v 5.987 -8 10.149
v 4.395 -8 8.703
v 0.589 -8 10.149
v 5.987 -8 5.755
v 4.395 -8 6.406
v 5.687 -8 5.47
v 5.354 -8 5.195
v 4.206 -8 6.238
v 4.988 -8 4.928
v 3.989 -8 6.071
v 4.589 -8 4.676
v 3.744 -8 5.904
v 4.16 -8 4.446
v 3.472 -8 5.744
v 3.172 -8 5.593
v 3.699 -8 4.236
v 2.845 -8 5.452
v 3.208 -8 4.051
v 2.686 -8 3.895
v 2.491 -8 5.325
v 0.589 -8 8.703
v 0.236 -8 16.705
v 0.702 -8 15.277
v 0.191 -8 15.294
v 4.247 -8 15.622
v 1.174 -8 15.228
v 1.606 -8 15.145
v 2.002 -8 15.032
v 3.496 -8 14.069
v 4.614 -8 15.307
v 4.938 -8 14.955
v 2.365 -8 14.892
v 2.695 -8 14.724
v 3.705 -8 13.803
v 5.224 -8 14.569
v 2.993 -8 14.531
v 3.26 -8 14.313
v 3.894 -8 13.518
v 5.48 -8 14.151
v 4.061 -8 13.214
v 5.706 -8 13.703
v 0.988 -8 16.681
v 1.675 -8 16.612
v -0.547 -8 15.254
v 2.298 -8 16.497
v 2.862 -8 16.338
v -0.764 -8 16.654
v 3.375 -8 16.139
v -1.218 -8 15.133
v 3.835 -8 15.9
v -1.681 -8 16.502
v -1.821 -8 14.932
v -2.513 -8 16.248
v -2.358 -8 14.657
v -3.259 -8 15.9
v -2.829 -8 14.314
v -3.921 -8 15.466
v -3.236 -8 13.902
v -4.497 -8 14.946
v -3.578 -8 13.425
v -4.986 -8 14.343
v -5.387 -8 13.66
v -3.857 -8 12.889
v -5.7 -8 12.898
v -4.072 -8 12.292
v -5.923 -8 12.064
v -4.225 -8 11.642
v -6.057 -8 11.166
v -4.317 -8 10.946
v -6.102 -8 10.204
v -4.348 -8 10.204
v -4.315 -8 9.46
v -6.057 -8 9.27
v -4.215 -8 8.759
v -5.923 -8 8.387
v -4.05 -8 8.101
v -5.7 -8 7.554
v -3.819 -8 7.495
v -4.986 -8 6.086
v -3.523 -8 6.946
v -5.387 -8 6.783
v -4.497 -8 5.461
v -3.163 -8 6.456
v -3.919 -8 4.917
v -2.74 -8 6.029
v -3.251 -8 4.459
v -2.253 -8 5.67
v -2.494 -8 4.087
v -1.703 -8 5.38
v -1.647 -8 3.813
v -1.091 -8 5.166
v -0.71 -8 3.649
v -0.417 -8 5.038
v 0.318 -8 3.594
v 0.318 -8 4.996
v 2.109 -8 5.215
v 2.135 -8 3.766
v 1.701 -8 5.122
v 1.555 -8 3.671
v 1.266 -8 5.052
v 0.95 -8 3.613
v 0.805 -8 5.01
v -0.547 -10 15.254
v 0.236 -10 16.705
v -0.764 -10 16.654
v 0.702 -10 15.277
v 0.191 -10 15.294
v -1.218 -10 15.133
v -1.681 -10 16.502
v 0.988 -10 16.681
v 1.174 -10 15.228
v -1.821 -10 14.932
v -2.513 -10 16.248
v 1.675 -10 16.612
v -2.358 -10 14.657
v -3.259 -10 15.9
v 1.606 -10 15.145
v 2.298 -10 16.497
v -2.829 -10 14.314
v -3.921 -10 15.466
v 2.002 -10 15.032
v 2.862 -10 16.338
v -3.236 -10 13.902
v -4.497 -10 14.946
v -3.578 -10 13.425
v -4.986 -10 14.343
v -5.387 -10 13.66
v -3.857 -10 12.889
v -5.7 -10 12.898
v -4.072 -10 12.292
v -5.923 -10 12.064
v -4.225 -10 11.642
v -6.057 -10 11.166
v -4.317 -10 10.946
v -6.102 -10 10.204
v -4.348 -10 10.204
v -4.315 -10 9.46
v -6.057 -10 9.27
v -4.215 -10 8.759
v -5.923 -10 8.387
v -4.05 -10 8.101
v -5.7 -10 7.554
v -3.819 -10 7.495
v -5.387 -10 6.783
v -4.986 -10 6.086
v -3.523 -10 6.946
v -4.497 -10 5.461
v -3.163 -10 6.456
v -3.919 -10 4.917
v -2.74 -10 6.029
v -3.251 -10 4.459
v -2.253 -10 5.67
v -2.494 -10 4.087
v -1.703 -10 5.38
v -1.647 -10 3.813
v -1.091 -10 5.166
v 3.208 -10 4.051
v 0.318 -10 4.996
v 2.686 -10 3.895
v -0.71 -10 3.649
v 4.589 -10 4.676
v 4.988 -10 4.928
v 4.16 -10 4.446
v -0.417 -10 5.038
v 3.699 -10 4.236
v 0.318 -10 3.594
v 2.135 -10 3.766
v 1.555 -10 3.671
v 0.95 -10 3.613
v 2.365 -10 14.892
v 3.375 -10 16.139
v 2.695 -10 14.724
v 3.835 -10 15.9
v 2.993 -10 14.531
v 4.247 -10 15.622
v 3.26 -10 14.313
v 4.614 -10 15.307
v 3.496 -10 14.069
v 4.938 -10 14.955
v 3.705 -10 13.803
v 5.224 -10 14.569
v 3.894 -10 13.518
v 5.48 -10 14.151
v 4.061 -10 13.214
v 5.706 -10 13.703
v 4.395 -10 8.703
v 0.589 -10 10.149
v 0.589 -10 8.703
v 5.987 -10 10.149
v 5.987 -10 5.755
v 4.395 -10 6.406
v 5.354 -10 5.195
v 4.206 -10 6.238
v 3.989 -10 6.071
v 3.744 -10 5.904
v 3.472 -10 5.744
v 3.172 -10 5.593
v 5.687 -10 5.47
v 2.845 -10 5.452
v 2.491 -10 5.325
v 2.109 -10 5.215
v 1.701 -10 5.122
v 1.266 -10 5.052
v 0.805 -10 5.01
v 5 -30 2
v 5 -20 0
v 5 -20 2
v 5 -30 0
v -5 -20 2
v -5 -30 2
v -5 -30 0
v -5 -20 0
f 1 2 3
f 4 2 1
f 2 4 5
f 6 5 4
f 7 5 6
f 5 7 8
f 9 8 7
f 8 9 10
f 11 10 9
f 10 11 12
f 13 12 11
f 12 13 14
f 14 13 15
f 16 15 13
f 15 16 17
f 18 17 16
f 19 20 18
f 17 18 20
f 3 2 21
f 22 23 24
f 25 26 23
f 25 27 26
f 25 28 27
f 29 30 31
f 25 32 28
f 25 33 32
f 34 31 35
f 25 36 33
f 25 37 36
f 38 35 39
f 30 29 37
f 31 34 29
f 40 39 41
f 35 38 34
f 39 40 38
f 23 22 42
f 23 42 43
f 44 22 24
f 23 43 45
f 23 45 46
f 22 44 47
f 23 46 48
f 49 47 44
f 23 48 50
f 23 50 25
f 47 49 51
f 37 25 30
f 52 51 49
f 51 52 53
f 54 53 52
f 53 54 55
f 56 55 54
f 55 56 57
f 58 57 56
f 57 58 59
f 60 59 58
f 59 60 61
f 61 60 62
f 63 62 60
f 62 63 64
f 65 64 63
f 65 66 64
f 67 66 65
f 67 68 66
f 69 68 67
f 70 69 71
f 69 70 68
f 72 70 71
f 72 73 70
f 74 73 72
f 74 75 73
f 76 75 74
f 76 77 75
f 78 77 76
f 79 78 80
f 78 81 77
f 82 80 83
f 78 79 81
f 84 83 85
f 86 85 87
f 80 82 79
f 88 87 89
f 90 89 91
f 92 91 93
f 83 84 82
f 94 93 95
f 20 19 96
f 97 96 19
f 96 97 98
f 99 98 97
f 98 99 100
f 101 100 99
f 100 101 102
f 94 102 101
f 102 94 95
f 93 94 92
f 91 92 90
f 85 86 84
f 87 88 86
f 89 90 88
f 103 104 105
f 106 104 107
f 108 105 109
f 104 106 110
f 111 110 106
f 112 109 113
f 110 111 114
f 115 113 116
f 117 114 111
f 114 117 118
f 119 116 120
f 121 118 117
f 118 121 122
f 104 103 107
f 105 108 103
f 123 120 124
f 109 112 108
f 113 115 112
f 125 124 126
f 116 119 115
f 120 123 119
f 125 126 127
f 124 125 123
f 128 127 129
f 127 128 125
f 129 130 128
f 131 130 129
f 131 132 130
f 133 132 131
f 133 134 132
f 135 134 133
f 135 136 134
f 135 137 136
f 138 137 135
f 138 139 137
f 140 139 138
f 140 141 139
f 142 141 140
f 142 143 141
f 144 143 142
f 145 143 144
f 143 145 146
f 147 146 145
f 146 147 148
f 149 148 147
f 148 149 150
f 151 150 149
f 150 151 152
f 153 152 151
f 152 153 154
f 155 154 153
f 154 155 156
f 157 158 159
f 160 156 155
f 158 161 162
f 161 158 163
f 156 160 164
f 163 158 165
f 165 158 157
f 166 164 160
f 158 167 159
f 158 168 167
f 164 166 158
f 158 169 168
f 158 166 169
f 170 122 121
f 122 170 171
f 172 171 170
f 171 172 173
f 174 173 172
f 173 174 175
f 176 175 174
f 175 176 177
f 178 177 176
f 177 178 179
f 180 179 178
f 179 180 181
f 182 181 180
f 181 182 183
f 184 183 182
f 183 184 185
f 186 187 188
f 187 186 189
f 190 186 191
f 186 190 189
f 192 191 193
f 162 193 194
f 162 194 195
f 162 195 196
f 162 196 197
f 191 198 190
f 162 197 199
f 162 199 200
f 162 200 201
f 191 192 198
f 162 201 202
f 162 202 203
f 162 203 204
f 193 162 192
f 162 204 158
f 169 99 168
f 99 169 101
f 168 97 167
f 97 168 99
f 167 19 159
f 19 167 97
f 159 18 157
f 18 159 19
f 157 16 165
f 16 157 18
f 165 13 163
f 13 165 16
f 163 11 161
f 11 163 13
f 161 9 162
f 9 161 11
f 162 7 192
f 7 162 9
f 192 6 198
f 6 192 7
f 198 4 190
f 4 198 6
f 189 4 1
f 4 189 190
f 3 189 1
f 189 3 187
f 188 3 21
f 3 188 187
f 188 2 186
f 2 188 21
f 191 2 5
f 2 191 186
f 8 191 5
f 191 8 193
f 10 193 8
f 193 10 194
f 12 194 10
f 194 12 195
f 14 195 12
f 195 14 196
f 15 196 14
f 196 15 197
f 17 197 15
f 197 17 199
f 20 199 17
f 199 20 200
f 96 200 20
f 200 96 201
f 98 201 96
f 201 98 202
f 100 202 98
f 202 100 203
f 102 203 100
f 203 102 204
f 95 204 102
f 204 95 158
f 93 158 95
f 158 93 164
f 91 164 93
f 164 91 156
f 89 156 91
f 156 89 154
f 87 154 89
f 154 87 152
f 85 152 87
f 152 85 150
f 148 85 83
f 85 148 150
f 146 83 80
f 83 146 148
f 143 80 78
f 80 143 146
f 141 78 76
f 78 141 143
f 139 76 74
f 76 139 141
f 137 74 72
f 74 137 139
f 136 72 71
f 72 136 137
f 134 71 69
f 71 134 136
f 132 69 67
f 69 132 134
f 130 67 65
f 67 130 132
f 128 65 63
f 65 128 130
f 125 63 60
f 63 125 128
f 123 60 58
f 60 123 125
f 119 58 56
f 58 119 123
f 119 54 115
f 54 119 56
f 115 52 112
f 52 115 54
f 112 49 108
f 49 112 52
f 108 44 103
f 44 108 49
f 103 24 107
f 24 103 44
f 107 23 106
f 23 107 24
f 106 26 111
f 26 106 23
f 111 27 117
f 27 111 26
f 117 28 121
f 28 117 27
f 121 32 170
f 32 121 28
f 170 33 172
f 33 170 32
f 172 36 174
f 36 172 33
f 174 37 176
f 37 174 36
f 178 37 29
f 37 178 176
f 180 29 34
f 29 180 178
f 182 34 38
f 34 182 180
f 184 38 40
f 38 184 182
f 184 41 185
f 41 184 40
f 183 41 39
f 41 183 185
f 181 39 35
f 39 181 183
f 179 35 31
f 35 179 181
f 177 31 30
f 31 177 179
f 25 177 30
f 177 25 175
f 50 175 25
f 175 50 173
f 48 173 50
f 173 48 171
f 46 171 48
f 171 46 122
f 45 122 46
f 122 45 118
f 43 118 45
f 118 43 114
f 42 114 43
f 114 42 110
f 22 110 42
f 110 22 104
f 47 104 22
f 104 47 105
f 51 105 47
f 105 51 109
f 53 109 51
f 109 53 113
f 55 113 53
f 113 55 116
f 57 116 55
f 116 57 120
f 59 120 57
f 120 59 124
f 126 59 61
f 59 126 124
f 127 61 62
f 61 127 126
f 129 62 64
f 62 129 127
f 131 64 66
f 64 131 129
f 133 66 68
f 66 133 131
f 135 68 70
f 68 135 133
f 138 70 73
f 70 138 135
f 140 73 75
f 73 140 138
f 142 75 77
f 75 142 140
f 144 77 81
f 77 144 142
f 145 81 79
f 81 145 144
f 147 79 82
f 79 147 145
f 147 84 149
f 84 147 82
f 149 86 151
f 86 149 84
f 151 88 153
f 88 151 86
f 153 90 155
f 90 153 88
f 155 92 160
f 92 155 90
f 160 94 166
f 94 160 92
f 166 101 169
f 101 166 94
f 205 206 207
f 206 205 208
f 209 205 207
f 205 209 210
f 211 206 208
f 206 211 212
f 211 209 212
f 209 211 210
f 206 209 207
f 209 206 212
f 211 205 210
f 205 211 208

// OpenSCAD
// CSG-modules.scad - Basic usage of modules, if, color, $fs/$fa

// Change this to false to remove the helper geometry
debug = true;

// Global resolution
$fs = 0.1;  // Don't generate smaller facets than 0.1 mm
$fa = 5;    // Don't generate larger angles than 5 degrees

TP_lower = 12.5/2;
TP_upper = 13.6/2;
TP_depth = 20;  // cube hieght
LowerWall = 3;
SideWall = 3;
ConnectionDepth = 10;

Letter = "G";
LetterSize = TP_depth *2/3;
LetterHeight = 2;
LetterFont = "Liberation Sans";

// Main geometry

//intersection()    // to make the wall part without rounded corners
//{
//    difference() {
//        translate([-TP_upper-SideWall,-TP_upper-SideWall,0]){
//            cubeX([TP_upper*2+SideWall*2, TP_upper*2+SideWall*2 + ConnectionDepth + 20, TP_depth], radius=2);
//        }
//        translate([0,0,LowerWall]){
//            cylinder(h = TP_depth-LowerWall, r1 = TP_lower, r2 = TP_upper, center = false);
//        }
//        cylinder(h = TP_depth, r = TP_lower*0.6, center = false);
        translate([0, -TP_depth/2 + LetterHeight, TP_depth/2]) rotate([90, 0, 0]) letter(Letter);
//    }
//    translate([-TP_upper-SideWall,-TP_upper-SideWall,0]){
//        cube([TP_upper*2+SideWall*2, TP_upper*2+SideWall*2 + ConnectionDepth, TP_depth]);
//    }
//}

translate([-5, -30 , 0]) cube([10,10,2]);

//
// Simple and fast corned cube!
// Anaximandro de Godinho.
//

module cubeX( size, radius=1, rounded=true, center=false )
{
	l = len( size );
	if( l == undef )
		_cubeX( size, size, size, radius, rounded, center );
	else
		_cubeX( size[0], size[1], size[2], radius, rounded, center );
}

module _cubeX( x, y, z, r, rounded, center )
{
	if( rounded )
		if( center )
			translate( [-x/2, -y/2, -z/2] )
			__cubeX( x, y, z, r );
		else
			__cubeX( x, y, z, r );
	else
		cube( [x, y, z], center );
}

module __cubeX(	x, y, z, r )
{
	//TODO: discount r.
	rC = r;
	hull()
	{
		translate( [rC, rC, rC] )
			sphere( r );
		translate( [rC, y-rC, rC] )
			sphere( r );
		translate( [rC, rC, z-rC] )
			sphere( r );
		translate( [rC, y-rC, z-rC] )
			sphere( r );

		translate( [x-rC, rC, rC] )
			sphere( r );
		translate( [x-rC, y-rC, rC] )
			sphere( r );
		translate( [x-rC, rC, z-rC] )
			sphere( r );
		translate( [x-rC, y-rC, z-rC] )
			sphere( r );
	}
}

module letter(l) {
  // Use linear_extrude() to make the letters 3D objects as they
  // are only 2D shapes when only using text()
  linear_extrude(height = LetterHeight) {
    text(l, size = LetterSize, font = LetterFont, halign = "center", valign = "center", $fn = 16);
  }
}
